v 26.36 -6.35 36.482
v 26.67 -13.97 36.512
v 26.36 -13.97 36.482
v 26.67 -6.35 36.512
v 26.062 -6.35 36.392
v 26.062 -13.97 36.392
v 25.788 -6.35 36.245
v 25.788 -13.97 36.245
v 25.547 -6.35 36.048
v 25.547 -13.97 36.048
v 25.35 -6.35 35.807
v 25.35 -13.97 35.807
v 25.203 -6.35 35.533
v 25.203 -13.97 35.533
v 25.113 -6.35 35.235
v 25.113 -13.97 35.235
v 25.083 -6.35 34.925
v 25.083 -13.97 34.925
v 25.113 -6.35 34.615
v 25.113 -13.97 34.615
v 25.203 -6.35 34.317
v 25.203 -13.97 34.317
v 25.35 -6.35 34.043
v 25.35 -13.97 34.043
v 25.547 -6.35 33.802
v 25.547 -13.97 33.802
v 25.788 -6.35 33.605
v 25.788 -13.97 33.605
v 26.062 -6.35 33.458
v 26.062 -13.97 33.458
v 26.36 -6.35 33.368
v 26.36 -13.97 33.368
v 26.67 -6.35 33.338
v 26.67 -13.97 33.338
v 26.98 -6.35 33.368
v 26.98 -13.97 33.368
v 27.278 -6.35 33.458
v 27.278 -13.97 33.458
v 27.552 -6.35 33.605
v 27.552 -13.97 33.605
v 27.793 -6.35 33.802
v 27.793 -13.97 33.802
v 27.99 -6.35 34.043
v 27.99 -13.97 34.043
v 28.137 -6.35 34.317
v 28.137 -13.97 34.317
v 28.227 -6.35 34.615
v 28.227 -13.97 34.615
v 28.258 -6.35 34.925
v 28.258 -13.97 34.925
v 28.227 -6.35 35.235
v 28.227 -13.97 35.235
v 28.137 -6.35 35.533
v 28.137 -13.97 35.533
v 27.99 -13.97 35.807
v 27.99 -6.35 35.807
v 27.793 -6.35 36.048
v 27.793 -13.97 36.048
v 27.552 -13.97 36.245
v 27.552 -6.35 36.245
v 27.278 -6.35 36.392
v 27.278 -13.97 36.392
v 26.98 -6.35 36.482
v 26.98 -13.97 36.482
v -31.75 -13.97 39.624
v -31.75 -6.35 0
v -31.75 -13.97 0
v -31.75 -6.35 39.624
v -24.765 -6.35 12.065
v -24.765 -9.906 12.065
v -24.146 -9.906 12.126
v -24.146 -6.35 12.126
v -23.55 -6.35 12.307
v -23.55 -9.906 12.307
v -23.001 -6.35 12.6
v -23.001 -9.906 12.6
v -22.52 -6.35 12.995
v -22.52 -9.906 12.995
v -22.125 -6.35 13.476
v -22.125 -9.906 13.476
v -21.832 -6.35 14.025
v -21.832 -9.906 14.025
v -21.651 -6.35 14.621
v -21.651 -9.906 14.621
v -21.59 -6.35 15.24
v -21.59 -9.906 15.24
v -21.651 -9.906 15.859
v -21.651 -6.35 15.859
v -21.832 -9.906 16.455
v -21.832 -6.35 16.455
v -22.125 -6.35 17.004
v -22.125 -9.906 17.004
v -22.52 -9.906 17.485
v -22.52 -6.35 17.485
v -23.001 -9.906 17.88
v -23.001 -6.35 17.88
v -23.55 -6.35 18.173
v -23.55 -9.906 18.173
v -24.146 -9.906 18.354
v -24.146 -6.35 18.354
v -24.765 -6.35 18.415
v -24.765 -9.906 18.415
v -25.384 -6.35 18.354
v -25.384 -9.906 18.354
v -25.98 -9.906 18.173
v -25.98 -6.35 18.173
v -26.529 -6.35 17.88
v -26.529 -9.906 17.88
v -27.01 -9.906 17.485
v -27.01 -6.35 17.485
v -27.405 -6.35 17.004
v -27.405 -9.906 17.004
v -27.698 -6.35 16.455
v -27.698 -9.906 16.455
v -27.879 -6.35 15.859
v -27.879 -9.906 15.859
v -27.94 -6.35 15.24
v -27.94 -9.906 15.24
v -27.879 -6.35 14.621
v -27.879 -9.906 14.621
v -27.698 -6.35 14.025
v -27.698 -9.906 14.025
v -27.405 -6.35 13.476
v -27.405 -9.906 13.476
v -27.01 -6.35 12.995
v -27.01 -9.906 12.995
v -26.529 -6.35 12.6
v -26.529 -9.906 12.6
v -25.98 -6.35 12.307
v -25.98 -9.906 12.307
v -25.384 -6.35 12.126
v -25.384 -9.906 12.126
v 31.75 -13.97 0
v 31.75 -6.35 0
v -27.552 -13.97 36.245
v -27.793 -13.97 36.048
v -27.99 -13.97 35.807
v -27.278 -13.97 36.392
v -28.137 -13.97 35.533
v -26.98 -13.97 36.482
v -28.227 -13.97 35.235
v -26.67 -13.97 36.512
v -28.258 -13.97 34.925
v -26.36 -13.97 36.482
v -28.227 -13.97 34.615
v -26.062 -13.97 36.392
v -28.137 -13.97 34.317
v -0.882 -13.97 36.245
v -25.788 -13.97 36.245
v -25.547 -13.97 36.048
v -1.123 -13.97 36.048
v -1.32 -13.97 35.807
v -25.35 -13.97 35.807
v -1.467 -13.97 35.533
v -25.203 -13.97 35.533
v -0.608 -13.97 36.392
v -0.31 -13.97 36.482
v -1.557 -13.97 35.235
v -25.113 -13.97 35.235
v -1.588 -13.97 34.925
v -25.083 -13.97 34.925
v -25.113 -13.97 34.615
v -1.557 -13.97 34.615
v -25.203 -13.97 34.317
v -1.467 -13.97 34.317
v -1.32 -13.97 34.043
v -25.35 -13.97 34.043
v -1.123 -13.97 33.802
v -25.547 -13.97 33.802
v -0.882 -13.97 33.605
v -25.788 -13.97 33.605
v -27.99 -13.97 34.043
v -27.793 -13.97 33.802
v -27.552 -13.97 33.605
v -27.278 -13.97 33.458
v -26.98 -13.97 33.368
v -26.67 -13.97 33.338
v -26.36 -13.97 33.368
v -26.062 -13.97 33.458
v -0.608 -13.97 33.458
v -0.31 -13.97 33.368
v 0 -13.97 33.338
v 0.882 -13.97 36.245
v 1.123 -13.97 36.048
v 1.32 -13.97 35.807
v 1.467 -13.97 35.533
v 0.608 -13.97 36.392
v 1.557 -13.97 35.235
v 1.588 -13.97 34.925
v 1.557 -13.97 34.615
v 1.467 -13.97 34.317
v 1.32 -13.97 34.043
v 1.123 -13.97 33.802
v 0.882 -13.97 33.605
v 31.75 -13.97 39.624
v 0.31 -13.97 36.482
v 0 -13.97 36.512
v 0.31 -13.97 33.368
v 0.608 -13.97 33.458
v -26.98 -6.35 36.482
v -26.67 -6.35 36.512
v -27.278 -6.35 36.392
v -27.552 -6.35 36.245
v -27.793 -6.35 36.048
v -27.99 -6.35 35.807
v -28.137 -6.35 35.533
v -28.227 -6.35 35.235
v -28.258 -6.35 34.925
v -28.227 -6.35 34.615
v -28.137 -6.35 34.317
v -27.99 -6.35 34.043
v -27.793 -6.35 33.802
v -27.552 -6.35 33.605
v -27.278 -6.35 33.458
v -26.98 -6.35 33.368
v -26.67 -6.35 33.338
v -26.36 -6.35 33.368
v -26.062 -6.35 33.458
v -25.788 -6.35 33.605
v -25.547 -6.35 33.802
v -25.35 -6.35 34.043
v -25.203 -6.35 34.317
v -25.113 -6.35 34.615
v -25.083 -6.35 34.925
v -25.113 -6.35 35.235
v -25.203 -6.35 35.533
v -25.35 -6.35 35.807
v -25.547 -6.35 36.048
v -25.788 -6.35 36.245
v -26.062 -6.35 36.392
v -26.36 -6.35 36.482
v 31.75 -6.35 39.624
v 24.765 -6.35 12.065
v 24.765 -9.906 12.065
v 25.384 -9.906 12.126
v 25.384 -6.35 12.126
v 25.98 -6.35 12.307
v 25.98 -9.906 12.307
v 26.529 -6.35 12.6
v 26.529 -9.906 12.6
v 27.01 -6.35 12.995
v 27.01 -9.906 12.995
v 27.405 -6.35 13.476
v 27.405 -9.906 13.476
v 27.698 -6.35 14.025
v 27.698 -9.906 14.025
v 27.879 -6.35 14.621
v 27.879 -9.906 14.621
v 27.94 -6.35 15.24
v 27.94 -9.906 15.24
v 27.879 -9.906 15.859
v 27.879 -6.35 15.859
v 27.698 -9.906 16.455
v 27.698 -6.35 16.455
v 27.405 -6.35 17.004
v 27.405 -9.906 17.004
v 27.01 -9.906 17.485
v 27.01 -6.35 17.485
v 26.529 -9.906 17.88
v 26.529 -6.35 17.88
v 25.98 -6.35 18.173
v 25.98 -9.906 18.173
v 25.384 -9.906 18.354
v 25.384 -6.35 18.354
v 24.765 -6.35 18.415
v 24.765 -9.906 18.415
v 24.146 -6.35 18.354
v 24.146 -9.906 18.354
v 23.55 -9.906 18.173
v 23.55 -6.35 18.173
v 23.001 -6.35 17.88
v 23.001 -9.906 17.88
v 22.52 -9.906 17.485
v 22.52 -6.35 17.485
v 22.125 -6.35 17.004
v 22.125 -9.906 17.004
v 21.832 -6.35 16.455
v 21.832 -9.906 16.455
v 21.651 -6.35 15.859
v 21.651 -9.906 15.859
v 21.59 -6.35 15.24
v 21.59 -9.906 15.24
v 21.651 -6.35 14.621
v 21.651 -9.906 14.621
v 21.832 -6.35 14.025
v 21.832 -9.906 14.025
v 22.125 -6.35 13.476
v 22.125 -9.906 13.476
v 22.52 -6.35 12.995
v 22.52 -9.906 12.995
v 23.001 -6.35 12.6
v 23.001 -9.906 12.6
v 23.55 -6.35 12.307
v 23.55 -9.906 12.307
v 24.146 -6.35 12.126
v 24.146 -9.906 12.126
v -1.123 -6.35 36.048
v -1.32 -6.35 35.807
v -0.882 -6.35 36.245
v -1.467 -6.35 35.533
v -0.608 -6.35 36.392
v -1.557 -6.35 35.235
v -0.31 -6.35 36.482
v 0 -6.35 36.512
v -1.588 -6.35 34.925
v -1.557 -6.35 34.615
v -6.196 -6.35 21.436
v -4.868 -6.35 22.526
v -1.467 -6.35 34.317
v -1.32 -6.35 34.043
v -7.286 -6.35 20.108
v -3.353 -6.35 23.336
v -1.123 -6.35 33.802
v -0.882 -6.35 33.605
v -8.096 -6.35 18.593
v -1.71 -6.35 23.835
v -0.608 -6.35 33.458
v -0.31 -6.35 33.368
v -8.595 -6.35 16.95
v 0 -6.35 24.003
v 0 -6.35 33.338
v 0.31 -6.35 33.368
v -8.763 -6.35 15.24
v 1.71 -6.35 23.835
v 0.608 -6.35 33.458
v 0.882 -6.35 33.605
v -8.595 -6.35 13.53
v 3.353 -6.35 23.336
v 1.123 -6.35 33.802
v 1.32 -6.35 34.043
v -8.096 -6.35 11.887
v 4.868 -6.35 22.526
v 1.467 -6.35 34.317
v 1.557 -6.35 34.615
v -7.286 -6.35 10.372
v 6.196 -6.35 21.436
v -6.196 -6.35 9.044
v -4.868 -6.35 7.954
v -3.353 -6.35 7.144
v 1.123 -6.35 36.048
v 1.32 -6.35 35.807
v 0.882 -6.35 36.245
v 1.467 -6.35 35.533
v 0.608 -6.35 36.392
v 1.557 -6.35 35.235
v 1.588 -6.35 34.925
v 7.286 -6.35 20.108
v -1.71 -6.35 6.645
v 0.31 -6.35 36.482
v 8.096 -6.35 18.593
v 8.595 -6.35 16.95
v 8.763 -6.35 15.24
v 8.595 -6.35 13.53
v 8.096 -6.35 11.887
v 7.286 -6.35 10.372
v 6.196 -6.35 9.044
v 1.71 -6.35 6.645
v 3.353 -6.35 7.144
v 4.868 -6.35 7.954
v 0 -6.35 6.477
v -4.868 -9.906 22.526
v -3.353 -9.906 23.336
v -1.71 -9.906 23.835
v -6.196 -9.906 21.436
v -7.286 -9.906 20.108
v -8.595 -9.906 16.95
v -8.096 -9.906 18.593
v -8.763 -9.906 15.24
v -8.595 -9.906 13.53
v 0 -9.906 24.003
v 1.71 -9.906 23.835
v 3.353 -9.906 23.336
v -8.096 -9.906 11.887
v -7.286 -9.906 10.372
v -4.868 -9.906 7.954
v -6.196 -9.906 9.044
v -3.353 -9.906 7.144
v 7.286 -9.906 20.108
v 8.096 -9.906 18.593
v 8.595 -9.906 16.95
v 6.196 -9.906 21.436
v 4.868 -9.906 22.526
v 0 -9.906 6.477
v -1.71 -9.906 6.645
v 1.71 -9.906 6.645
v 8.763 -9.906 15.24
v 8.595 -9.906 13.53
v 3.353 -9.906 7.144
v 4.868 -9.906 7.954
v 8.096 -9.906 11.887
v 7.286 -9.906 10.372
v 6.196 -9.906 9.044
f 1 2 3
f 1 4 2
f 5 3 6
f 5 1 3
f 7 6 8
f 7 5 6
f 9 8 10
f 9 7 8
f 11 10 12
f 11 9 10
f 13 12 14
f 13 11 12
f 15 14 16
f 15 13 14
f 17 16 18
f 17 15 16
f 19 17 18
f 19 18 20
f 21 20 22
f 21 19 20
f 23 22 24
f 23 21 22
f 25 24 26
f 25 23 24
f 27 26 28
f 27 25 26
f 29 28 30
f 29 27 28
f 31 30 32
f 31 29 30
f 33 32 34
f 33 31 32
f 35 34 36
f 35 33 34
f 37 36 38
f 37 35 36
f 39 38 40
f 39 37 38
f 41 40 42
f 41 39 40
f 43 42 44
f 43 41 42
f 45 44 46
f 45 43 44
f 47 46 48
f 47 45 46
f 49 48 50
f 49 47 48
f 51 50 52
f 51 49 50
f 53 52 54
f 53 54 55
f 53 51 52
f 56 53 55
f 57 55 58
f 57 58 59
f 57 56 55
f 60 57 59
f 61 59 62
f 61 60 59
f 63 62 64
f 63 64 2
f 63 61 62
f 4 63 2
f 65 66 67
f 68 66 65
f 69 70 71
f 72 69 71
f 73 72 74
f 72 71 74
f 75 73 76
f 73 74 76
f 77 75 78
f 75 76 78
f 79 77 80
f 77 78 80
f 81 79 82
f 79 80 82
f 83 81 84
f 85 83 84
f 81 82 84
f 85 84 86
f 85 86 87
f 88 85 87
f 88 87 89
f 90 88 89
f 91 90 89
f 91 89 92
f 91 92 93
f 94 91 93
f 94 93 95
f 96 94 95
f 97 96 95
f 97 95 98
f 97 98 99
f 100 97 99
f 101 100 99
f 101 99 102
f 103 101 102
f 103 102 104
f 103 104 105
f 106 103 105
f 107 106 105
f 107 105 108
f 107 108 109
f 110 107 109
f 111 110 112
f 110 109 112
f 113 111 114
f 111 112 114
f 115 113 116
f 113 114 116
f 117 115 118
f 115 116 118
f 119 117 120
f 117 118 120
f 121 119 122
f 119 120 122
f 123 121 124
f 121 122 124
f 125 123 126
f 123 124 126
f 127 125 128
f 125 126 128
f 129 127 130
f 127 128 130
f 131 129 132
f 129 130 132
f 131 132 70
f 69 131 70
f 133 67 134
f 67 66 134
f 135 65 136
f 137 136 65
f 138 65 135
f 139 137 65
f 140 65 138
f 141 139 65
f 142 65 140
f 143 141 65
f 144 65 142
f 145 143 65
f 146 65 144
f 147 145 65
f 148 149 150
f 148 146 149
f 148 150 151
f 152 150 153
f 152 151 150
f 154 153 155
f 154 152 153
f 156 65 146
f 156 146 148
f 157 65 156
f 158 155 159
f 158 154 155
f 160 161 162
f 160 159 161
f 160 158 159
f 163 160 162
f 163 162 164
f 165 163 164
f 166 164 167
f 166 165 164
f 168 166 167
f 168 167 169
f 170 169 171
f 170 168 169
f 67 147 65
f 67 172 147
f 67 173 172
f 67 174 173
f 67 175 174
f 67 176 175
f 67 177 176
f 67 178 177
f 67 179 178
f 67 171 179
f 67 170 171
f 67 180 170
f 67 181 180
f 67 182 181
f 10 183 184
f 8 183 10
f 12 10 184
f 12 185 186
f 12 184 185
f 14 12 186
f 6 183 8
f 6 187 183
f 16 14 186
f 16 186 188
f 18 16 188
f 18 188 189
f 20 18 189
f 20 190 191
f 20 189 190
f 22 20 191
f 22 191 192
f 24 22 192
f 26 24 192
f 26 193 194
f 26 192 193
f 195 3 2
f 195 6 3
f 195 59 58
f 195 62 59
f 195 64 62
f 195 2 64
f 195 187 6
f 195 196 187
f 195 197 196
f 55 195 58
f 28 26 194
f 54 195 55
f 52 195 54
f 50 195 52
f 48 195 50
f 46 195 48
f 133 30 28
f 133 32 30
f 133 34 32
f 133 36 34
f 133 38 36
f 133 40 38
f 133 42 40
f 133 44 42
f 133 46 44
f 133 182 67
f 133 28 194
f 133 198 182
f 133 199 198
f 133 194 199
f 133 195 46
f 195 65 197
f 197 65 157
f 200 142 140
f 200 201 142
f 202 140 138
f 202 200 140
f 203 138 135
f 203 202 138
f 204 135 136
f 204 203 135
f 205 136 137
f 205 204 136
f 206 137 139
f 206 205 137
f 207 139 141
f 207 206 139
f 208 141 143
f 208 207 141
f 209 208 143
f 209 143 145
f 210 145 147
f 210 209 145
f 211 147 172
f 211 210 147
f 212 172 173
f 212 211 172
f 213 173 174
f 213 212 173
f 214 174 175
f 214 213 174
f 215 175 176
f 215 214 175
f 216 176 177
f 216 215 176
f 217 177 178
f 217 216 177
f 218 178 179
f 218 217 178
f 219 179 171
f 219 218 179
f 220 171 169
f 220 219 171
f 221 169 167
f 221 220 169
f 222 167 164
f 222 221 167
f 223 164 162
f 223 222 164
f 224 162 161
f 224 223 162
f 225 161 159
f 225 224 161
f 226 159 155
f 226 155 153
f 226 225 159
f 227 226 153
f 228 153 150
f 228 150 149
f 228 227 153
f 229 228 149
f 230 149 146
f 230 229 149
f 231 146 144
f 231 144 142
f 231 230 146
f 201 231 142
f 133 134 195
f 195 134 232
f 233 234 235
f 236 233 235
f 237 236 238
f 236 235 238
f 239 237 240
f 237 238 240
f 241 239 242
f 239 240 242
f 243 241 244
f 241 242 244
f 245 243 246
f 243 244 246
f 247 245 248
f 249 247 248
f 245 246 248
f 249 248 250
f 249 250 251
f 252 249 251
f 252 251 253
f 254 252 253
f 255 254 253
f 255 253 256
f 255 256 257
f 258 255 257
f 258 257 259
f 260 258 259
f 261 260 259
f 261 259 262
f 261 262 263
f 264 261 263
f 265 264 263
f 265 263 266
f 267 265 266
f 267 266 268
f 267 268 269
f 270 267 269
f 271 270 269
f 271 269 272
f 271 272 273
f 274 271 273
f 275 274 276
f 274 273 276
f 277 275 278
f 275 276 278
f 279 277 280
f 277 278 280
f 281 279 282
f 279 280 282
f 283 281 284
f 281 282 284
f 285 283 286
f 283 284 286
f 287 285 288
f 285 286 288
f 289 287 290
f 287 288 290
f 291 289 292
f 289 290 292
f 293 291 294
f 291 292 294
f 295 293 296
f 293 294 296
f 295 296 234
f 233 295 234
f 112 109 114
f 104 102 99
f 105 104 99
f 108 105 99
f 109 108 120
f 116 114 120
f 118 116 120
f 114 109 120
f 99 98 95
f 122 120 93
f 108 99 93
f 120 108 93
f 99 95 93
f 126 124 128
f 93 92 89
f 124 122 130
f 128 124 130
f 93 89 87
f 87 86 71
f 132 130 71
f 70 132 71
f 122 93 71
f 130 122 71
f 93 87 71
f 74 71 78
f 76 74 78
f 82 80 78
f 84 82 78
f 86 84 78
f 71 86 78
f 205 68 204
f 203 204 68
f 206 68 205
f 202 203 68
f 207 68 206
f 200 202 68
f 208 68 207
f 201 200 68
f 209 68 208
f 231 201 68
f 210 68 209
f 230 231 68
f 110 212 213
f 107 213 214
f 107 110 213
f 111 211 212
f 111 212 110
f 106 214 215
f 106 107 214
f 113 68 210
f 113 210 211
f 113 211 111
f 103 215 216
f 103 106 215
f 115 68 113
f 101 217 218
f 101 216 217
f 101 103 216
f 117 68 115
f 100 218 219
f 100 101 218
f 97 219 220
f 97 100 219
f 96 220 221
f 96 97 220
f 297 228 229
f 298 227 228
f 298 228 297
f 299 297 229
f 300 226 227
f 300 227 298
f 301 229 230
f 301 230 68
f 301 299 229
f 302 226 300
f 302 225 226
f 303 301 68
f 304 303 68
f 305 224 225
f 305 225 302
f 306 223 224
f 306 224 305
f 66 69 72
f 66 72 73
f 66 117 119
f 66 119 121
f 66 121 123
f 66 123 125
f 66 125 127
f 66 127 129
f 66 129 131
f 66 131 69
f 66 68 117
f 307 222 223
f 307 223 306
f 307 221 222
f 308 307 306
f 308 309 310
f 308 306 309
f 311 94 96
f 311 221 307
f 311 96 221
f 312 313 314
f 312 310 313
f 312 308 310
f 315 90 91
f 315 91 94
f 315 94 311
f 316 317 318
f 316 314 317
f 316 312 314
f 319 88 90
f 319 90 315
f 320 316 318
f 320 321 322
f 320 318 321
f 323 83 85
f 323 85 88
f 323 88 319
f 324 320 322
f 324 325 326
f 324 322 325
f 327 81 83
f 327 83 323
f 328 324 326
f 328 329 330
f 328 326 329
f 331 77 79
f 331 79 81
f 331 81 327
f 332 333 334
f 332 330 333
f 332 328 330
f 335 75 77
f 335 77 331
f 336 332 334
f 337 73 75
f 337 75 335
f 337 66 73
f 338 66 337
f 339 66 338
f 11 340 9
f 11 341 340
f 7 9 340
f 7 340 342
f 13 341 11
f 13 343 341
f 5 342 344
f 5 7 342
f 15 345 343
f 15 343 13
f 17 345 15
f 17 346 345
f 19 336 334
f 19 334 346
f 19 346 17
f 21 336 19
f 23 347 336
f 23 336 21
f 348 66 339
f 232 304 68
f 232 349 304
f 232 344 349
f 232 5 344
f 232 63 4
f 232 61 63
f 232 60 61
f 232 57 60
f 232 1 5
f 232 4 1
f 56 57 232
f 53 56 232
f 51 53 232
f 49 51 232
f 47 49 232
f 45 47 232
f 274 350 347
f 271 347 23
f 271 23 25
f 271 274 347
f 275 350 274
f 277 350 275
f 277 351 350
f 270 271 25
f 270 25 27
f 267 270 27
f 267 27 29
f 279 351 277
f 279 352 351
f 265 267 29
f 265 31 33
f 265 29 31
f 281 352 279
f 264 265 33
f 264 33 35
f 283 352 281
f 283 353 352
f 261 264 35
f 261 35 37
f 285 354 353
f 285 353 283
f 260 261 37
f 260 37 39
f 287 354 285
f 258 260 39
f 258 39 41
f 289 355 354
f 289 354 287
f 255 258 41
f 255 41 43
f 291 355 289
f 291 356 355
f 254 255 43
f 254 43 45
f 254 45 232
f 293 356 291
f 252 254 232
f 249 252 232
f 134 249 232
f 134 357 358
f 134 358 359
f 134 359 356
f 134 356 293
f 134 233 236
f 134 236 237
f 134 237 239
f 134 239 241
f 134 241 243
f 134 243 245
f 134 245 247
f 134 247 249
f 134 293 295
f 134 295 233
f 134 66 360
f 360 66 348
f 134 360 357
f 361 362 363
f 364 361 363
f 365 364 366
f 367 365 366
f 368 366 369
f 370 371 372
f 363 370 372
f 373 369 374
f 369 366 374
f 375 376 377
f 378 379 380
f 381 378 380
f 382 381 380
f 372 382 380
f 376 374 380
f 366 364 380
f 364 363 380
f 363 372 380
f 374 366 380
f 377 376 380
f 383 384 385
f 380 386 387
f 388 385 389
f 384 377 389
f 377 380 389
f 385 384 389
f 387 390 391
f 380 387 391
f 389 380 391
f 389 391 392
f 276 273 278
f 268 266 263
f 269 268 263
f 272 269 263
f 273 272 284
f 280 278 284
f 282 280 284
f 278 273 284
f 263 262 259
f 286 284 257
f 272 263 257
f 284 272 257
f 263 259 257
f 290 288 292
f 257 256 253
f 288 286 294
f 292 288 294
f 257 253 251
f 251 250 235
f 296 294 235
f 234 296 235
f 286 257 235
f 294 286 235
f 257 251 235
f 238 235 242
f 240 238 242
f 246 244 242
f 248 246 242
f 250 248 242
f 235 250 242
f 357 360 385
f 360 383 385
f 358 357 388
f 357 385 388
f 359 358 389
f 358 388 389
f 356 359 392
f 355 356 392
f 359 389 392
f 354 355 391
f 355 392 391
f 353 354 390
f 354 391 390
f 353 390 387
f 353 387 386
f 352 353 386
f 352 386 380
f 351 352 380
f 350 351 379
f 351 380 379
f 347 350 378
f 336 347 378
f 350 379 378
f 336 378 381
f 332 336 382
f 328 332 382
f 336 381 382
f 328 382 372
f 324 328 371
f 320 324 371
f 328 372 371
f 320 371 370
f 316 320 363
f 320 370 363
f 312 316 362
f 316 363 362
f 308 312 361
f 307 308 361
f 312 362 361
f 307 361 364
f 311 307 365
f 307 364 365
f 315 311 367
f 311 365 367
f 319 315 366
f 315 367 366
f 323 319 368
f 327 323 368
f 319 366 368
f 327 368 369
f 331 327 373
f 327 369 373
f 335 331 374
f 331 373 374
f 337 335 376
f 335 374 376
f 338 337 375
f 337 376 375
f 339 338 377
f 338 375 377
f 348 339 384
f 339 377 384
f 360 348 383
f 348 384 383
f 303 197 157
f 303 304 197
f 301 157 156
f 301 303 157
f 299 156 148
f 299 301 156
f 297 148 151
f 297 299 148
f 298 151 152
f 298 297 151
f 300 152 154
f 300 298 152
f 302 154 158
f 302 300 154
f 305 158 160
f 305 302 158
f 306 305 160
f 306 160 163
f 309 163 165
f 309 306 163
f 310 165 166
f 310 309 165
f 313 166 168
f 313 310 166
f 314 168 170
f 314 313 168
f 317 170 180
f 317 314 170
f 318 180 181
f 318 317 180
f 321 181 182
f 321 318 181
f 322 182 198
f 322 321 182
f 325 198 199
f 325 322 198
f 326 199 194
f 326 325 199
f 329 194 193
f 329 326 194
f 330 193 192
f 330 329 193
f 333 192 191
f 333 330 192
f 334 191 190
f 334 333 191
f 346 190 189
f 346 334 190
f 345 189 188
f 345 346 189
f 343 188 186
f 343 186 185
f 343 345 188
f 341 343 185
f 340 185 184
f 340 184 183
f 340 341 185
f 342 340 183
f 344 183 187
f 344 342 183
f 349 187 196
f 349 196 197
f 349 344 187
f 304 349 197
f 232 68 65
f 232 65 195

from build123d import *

# Parameters (mm, degrees)
SKETCH1_W           = 63.5
SKETCH1_H           = 25.4
BOSS_EXTRUDE1_DEPTH = 38.1
SKETCH2_R           = 3.175
CUT_EXTRUDE1_DEPTH  = 12.7
SKETCH2_3_R         = 8.763
CUT_EXTRUDE2_DEPTH  = 4.826
CUT_EXTRUDE3_START  = -20.574
SKETCH3_R           = 6.35
CUT_EXTRUDE3_DEPTH  = 20.574
SKETCH4_R           = 10.795
CUT_EXTRUDE4_DEPTH  = 19.05
SKETCH5_R           = 1.5875
CUT_EXTRUDE5_DEPTH  = 50.8
SKETCH6_W           = 63.5
SKETCH6_H           = 1.27
CUT_EXTRUDE6_DEPTH  = 38.1
SKETCH7_W           = 63.5
SKETCH7_H           = 24.13
BOSS_EXTRUDE2_DEPTH = 1.524
SKETCH8_W           = 95.143419866
SKETCH8_H           = 69.172862942
CUT_EXTRUDE7_DEPTH  = 55.231230633
SKETCH9_W           = 63.5
SKETCH9_H           = 39.624
SKETCH9_R           = 1.5875
SKETCH9_R_2         = 3.175
SKETCH9_R_3         = 8.763
BOSS_EXTRUDE3_DEPTH = 2.54
SKETCH10_R          = 8.763
SKETCH10_R_2        = 6.35
CUT_EXTRUDE9_DEPTH  = 52.343824127
SKETCH11_R          = 8.763
SKETCH11_R_2        = 3.175
BOSS_EXTRUDE5_DEPTH = 4.064


with BuildPart() as part:
    # Sketch1 → Boss-Extrude1 (new body)
    with BuildSketch(Plane.XY):
        Rectangle(SKETCH1_W, SKETCH1_H)
    extrude(amount=BOSS_EXTRUDE1_DEPTH)

    # Sketch2 → Cut-Extrude1 (cut)
    with BuildSketch(Plane.XZ.offset(12.7)):
        with Locations(Location((-24.765, 15.24, 0), (0, 0, 270))):
            Circle(SKETCH2_R)
        with Locations(Location((24.765, 15.24, 0), (0, 0, 270))):
            Circle(SKETCH2_R)
    extrude(amount=-CUT_EXTRUDE1_DEPTH, mode=Mode.SUBTRACT)

    # Sketch2<3> → Cut-Extrude2 (cut)
    with BuildSketch(Plane.XZ.offset(12.7)):
        with Locations(Location((0, 15.24, 0), (0, 0, 270))):
            Circle(SKETCH2_3_R)
    extrude(amount=-CUT_EXTRUDE2_DEPTH, mode=Mode.SUBTRACT)

    # Sketch3 → Cut-Extrude3 (cut)
    with BuildSketch(Plane.XZ.offset(7.874).offset(CUT_EXTRUDE3_START)):
        with Locations(Location((0, 15.24, 0), (0, 0, 270))):
            Circle(SKETCH3_R)
    extrude(amount=CUT_EXTRUDE3_DEPTH, mode=Mode.SUBTRACT)

    # Sketch4 → Cut-Extrude4 (cut)
    with BuildSketch(Plane(origin=(0, 12.7, 0), x_dir=(1, 0, 0), z_dir=(0, 1, 0))):
        with Locations(Location((0, -15.24, 0), (0, 0, 270))):
            Circle(SKETCH4_R)
    extrude(amount=-CUT_EXTRUDE4_DEPTH, mode=Mode.SUBTRACT)

    # Sketch5 → Cut-Extrude5 (cut)
    with BuildSketch(Plane(origin=(0, 12.7, 0), x_dir=(1, 0, 0), z_dir=(0, 1, 0))):
        with Locations(Location((-26.67, -34.925, 0), (0, 0, 270))):
            Circle(SKETCH5_R)
        with Locations(Location((0, -34.925, 0), (0, 0, 270))):
            Circle(SKETCH5_R)
        with Locations(Location((26.67, -34.925, 0), (0, 0, 270))):
            Circle(SKETCH5_R)
    extrude(amount=-CUT_EXTRUDE5_DEPTH, mode=Mode.SUBTRACT)

    # Sketch6 → Cut-Extrude6 (cut)
    with BuildSketch(Plane.XY.offset(38.1)):
        with Locations((0, -12.065)):
            Rectangle(SKETCH6_W, SKETCH6_H)
    extrude(amount=-CUT_EXTRUDE6_DEPTH, mode=Mode.SUBTRACT)

    # Sketch7 → Boss-Extrude2 (add)
    with BuildSketch(Plane.XY.offset(38.1)):
        with Locations((0, 0.635)):
            Rectangle(SKETCH7_W, SKETCH7_H)
    extrude(amount=BOSS_EXTRUDE2_DEPTH)

    # Sketch8 → Cut-Extrude7 (cut, through all)
    with BuildSketch(Plane(origin=(0, -6.35, 0), x_dir=(1, 0, 0), z_dir=(0, 1, 0))):
        with Locations((5.084942731, -21.829519101)):
            Rectangle(SKETCH8_W, SKETCH8_H)
    extrude(amount=CUT_EXTRUDE7_DEPTH, mode=Mode.SUBTRACT)

    # Sketch9 → Boss-Extrude3 (add)
    with BuildSketch(Plane.XZ.offset(11.43)):
        with Locations((0, 19.812)):
            Rectangle(SKETCH9_W, SKETCH9_H)
        with Locations(Location((26.67, 34.925, 0), (0, 0, 90))):
            Circle(SKETCH9_R, mode=Mode.SUBTRACT)
        with Locations(Location((0, 34.925, 0), (0, 0, 90))):
            Circle(SKETCH9_R, mode=Mode.SUBTRACT)
        with Locations(Location((-26.67, 34.925, 0), (0, 0, 90))):
            Circle(SKETCH9_R, mode=Mode.SUBTRACT)
        with Locations(Location((-24.765, 15.24, 0), (0, 0, 270))):
            Circle(SKETCH9_R_2, mode=Mode.SUBTRACT)
        with Locations(Location((0, 15.24, 0), (0, 0, 270))):
            Circle(SKETCH9_R_3, mode=Mode.SUBTRACT)
        with Locations(Location((24.765, 15.24, 0), (0, 0, 270))):
            Circle(SKETCH9_R_2, mode=Mode.SUBTRACT)
    extrude(amount=BOSS_EXTRUDE3_DEPTH)

    # Sketch10 → Cut-Extrude9 (cut, through all)
    with BuildSketch(Plane.XZ.offset(13.97)):
        with Locations(Location((0, 15.24, 0), (0, 0, 270))):
            Circle(SKETCH10_R)
        with Locations((0, 15.24)):
            Circle(SKETCH10_R_2, mode=Mode.SUBTRACT)
    extrude(amount=-CUT_EXTRUDE9_DEPTH, mode=Mode.SUBTRACT)

    # Sketch11 → Boss-Extrude5 (add)
    with BuildSketch(Plane.XZ.offset(13.97)):
        with Locations(Location((0, 15.24, 0), (0, 0, 270))):
            Circle(SKETCH11_R)
        with Locations(Location((24.765, 15.24, 0), (0, 0, 270))):
            Circle(SKETCH11_R_2)
        with Locations(Location((-24.765, 15.24, 0), (0, 0, 270))):
            Circle(SKETCH11_R_2)
    extrude(amount=-BOSS_EXTRUDE5_DEPTH)


solid = part.part
